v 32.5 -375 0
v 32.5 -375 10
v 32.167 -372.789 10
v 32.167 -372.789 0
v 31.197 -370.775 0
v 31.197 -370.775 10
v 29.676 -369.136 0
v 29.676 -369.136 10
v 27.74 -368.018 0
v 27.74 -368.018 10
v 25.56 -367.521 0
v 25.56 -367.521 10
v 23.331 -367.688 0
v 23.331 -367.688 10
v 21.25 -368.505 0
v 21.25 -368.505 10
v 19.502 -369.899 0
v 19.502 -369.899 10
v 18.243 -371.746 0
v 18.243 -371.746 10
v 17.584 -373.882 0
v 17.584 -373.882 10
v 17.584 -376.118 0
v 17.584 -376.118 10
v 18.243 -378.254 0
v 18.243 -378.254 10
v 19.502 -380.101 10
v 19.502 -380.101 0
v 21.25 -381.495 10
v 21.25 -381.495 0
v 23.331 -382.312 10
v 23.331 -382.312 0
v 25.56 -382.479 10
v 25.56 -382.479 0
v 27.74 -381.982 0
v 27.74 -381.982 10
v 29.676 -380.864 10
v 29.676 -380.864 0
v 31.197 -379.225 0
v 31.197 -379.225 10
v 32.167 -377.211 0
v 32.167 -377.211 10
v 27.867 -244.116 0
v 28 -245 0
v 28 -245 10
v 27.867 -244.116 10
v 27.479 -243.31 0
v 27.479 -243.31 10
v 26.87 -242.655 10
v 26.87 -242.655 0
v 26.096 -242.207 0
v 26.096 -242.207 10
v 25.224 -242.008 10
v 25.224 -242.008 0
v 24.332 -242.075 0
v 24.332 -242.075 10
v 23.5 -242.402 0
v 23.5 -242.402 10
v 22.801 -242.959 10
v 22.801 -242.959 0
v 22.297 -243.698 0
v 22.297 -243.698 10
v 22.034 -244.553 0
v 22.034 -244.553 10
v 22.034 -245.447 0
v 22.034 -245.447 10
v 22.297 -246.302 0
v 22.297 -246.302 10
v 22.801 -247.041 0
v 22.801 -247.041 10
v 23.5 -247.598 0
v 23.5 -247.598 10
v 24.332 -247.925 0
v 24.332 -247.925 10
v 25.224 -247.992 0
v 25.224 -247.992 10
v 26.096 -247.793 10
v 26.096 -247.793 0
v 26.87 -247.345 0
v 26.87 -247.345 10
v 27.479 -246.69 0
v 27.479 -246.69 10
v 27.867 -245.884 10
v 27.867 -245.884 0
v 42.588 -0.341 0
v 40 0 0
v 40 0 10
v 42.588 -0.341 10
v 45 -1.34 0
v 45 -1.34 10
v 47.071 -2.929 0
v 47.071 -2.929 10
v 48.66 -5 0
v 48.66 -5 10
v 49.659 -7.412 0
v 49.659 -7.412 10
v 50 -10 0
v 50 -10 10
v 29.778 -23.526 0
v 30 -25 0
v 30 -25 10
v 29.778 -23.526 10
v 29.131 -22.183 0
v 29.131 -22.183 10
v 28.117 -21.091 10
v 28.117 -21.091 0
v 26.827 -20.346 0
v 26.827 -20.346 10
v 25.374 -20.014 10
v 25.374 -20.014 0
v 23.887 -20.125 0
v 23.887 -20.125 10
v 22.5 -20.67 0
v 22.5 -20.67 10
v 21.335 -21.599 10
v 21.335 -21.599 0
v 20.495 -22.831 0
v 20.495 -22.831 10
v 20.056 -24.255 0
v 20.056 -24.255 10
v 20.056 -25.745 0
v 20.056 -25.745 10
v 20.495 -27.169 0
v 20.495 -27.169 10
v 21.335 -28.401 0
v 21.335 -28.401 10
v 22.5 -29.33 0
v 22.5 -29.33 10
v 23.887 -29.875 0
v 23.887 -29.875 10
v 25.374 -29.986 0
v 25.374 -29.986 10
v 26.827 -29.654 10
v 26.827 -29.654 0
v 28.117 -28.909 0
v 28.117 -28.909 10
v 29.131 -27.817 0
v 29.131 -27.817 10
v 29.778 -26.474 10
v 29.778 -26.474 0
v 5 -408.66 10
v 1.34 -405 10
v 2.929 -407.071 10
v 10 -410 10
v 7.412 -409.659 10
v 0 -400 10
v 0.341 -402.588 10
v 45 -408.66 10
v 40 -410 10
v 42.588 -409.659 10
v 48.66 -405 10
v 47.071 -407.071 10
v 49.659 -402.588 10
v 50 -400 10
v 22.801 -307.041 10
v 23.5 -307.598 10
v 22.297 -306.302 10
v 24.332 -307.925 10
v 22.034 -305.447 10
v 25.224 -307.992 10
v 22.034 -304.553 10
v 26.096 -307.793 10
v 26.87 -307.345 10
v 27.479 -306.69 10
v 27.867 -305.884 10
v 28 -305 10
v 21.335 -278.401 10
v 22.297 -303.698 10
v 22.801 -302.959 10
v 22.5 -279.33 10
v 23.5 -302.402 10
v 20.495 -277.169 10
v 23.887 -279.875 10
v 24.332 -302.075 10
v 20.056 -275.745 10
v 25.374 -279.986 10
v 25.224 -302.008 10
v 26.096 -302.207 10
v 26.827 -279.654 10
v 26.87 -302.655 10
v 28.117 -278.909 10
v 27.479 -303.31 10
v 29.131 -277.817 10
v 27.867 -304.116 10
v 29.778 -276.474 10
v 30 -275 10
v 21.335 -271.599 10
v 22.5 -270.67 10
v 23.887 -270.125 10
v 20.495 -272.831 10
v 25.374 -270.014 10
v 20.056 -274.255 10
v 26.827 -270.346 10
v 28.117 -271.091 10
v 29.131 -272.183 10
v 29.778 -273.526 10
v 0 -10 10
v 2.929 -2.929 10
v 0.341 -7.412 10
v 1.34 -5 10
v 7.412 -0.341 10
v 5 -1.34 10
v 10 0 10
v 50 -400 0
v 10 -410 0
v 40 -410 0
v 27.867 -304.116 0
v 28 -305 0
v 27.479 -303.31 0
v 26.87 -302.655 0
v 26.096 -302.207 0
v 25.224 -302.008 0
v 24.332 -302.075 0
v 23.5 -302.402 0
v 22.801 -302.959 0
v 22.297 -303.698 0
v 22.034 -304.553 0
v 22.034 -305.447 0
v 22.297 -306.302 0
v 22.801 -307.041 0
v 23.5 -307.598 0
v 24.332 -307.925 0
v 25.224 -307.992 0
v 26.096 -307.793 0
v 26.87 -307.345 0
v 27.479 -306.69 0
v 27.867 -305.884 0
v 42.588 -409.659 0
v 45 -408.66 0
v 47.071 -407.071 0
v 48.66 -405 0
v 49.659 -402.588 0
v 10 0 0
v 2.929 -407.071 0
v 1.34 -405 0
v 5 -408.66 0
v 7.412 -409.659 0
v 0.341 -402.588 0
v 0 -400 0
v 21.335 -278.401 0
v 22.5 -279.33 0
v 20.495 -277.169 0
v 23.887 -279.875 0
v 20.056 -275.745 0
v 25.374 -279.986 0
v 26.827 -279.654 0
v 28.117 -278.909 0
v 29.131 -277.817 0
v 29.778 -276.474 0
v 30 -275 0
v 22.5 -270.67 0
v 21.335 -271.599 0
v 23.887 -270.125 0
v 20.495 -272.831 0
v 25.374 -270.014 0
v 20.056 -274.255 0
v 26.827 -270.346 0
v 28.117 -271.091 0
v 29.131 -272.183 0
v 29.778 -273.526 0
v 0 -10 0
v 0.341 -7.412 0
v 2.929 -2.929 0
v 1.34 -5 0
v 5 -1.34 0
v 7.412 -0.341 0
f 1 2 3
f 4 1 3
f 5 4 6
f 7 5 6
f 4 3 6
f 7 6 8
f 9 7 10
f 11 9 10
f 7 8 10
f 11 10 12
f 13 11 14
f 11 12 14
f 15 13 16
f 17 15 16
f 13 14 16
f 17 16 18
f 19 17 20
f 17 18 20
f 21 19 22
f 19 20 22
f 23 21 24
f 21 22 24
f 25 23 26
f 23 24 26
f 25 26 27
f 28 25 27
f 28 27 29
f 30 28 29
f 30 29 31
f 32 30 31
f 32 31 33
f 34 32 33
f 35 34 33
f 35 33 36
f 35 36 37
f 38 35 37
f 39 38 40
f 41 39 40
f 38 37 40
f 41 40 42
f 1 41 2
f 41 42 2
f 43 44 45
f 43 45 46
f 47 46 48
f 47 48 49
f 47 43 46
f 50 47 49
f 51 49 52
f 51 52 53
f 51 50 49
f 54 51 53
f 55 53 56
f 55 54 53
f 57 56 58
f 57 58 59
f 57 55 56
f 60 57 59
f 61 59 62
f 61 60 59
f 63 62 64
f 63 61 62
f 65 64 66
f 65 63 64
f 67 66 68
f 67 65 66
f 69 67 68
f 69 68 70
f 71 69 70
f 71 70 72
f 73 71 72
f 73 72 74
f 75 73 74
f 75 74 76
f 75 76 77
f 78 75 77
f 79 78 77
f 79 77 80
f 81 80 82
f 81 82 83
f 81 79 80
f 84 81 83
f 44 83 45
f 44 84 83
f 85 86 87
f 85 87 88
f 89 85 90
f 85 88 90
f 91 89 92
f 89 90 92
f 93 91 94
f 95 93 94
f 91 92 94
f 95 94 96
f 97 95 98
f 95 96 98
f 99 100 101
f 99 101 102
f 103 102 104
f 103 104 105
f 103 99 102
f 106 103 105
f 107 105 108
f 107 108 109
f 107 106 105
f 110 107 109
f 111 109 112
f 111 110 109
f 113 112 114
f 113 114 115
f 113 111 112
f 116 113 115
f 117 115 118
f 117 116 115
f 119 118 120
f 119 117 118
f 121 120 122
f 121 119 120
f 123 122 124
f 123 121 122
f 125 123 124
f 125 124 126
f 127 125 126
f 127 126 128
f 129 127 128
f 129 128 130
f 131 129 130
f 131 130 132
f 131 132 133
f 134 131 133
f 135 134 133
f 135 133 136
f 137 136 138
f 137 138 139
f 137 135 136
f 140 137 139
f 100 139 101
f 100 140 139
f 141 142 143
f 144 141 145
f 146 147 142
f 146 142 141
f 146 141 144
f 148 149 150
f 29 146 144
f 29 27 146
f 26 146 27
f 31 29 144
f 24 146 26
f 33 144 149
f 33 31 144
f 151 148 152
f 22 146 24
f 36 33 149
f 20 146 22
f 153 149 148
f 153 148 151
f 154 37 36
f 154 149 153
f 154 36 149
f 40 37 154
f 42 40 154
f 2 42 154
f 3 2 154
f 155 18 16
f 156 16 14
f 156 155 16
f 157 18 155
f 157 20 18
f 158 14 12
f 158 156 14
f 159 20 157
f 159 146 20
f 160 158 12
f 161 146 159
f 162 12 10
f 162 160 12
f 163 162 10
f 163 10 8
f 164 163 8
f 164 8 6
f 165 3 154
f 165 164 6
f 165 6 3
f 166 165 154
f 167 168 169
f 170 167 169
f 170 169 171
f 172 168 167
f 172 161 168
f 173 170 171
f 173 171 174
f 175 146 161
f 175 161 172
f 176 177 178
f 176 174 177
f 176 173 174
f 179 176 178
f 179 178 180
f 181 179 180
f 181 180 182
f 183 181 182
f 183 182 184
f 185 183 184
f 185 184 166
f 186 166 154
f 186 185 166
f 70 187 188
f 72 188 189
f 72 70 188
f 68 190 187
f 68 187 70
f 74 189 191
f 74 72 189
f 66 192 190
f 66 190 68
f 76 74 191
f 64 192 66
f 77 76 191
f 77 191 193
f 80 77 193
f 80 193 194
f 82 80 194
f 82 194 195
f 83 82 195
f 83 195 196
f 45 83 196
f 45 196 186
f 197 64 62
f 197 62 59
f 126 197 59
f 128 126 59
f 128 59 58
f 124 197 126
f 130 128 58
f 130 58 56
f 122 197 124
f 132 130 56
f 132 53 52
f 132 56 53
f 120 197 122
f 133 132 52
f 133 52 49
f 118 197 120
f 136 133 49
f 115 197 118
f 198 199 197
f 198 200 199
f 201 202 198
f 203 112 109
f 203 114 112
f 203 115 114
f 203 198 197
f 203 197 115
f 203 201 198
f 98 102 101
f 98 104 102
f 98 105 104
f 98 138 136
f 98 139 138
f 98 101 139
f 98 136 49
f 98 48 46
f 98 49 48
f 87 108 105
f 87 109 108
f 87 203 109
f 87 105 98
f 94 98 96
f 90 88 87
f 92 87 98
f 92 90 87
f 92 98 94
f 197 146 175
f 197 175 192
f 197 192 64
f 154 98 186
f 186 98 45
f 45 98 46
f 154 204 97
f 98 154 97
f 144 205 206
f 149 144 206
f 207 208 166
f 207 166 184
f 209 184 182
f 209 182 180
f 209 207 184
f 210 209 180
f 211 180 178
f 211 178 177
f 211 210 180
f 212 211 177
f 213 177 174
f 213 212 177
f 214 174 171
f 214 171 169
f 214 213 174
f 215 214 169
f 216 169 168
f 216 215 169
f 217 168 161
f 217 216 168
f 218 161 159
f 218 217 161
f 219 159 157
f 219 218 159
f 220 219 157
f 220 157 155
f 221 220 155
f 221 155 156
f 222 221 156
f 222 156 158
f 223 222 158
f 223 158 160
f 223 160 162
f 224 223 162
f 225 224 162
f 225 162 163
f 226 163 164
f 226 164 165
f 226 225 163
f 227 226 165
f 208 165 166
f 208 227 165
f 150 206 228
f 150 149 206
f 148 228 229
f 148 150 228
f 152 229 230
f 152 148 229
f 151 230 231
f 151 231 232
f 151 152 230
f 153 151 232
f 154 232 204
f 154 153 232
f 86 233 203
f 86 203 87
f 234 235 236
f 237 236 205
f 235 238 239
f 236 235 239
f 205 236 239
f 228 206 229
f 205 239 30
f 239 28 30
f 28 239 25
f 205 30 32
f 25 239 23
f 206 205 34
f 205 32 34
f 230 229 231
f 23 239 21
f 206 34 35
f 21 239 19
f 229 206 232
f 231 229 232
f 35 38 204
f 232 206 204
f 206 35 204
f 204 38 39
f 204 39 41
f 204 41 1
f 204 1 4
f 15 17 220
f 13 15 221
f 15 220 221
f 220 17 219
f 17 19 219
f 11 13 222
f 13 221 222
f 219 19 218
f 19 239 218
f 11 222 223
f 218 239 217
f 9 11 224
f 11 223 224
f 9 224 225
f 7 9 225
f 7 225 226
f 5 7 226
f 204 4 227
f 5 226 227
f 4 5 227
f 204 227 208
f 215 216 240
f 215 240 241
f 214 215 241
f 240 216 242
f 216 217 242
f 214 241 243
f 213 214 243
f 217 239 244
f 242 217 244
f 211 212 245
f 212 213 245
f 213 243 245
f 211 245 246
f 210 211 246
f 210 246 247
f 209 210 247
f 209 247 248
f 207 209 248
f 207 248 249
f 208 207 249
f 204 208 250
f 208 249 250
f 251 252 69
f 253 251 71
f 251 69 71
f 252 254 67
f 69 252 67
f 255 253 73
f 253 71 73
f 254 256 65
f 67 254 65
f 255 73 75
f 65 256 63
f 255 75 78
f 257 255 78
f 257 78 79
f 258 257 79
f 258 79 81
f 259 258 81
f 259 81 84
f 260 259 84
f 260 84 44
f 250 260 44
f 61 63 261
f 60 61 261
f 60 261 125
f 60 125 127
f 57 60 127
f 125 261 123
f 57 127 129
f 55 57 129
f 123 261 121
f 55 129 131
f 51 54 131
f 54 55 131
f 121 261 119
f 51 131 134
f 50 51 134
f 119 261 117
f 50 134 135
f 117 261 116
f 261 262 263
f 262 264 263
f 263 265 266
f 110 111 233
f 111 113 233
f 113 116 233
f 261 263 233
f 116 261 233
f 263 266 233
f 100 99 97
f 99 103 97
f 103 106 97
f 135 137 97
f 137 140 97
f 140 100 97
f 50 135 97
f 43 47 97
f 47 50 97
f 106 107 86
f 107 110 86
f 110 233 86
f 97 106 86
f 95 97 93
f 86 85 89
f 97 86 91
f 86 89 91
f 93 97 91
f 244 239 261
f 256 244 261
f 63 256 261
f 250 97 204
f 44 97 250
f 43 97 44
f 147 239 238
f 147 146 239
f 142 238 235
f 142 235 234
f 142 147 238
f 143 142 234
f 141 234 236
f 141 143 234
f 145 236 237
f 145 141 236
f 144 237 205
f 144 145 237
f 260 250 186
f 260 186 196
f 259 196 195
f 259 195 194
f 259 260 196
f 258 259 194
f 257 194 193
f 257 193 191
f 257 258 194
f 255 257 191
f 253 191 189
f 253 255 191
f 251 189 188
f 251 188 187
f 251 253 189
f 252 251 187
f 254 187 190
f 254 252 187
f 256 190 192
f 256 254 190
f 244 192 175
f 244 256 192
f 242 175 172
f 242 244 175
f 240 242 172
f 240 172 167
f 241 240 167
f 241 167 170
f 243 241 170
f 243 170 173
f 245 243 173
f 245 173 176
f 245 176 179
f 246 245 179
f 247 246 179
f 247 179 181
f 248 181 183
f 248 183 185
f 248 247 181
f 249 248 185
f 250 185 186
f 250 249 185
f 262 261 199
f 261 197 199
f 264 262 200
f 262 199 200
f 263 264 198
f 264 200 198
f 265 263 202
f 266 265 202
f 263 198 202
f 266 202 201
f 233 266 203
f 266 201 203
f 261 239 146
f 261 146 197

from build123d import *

# Parameters (mm, degrees)
SKETCH1_W           = 50
SKETCH1_H           = 410
SKETCH1_R           = 5
SKETCH1_R_2         = 3
BOSS_EXTRUDE1_DEPTH = 10
FILLET1_R           = 10
SKETCH2_R           = 7.5
CUT_EXTRUDE1_DEPTH  = 10


with BuildPart() as part:
    # Sketch1 → Boss-Extrude1 (new body)
    with BuildSketch(Plane.XY):
        with Locations((25, -205)):
            Rectangle(SKETCH1_W, SKETCH1_H)
        with Locations((25, -275)):
            Circle(SKETCH1_R, mode=Mode.SUBTRACT)
        with Locations((25, -25)):
            Circle(SKETCH1_R, mode=Mode.SUBTRACT)
        with Locations((25, -245)):
            Circle(SKETCH1_R_2, mode=Mode.SUBTRACT)
        with Locations((25, -305)):
            Circle(SKETCH1_R_2, mode=Mode.SUBTRACT)
    extrude(amount=BOSS_EXTRUDE1_DEPTH)

    # Fillet1
    fillet1_edges = [part.edges().sort_by_distance(p)[0] for p in [
        (0, 0, 5),
        (50, 0, 5),
        (50, -410, 5),
        (0, -410, 5),
    ]]
    fillet(fillet1_edges, radius=FILLET1_R)

    # Sketch2 → Cut-Extrude1 (cut)
    with BuildSketch(Plane.XY.offset(10)):
        with Locations((25, -375)):
            Circle(SKETCH2_R)
    extrude(amount=-CUT_EXTRUDE1_DEPTH, mode=Mode.SUBTRACT)


solid = part.part
